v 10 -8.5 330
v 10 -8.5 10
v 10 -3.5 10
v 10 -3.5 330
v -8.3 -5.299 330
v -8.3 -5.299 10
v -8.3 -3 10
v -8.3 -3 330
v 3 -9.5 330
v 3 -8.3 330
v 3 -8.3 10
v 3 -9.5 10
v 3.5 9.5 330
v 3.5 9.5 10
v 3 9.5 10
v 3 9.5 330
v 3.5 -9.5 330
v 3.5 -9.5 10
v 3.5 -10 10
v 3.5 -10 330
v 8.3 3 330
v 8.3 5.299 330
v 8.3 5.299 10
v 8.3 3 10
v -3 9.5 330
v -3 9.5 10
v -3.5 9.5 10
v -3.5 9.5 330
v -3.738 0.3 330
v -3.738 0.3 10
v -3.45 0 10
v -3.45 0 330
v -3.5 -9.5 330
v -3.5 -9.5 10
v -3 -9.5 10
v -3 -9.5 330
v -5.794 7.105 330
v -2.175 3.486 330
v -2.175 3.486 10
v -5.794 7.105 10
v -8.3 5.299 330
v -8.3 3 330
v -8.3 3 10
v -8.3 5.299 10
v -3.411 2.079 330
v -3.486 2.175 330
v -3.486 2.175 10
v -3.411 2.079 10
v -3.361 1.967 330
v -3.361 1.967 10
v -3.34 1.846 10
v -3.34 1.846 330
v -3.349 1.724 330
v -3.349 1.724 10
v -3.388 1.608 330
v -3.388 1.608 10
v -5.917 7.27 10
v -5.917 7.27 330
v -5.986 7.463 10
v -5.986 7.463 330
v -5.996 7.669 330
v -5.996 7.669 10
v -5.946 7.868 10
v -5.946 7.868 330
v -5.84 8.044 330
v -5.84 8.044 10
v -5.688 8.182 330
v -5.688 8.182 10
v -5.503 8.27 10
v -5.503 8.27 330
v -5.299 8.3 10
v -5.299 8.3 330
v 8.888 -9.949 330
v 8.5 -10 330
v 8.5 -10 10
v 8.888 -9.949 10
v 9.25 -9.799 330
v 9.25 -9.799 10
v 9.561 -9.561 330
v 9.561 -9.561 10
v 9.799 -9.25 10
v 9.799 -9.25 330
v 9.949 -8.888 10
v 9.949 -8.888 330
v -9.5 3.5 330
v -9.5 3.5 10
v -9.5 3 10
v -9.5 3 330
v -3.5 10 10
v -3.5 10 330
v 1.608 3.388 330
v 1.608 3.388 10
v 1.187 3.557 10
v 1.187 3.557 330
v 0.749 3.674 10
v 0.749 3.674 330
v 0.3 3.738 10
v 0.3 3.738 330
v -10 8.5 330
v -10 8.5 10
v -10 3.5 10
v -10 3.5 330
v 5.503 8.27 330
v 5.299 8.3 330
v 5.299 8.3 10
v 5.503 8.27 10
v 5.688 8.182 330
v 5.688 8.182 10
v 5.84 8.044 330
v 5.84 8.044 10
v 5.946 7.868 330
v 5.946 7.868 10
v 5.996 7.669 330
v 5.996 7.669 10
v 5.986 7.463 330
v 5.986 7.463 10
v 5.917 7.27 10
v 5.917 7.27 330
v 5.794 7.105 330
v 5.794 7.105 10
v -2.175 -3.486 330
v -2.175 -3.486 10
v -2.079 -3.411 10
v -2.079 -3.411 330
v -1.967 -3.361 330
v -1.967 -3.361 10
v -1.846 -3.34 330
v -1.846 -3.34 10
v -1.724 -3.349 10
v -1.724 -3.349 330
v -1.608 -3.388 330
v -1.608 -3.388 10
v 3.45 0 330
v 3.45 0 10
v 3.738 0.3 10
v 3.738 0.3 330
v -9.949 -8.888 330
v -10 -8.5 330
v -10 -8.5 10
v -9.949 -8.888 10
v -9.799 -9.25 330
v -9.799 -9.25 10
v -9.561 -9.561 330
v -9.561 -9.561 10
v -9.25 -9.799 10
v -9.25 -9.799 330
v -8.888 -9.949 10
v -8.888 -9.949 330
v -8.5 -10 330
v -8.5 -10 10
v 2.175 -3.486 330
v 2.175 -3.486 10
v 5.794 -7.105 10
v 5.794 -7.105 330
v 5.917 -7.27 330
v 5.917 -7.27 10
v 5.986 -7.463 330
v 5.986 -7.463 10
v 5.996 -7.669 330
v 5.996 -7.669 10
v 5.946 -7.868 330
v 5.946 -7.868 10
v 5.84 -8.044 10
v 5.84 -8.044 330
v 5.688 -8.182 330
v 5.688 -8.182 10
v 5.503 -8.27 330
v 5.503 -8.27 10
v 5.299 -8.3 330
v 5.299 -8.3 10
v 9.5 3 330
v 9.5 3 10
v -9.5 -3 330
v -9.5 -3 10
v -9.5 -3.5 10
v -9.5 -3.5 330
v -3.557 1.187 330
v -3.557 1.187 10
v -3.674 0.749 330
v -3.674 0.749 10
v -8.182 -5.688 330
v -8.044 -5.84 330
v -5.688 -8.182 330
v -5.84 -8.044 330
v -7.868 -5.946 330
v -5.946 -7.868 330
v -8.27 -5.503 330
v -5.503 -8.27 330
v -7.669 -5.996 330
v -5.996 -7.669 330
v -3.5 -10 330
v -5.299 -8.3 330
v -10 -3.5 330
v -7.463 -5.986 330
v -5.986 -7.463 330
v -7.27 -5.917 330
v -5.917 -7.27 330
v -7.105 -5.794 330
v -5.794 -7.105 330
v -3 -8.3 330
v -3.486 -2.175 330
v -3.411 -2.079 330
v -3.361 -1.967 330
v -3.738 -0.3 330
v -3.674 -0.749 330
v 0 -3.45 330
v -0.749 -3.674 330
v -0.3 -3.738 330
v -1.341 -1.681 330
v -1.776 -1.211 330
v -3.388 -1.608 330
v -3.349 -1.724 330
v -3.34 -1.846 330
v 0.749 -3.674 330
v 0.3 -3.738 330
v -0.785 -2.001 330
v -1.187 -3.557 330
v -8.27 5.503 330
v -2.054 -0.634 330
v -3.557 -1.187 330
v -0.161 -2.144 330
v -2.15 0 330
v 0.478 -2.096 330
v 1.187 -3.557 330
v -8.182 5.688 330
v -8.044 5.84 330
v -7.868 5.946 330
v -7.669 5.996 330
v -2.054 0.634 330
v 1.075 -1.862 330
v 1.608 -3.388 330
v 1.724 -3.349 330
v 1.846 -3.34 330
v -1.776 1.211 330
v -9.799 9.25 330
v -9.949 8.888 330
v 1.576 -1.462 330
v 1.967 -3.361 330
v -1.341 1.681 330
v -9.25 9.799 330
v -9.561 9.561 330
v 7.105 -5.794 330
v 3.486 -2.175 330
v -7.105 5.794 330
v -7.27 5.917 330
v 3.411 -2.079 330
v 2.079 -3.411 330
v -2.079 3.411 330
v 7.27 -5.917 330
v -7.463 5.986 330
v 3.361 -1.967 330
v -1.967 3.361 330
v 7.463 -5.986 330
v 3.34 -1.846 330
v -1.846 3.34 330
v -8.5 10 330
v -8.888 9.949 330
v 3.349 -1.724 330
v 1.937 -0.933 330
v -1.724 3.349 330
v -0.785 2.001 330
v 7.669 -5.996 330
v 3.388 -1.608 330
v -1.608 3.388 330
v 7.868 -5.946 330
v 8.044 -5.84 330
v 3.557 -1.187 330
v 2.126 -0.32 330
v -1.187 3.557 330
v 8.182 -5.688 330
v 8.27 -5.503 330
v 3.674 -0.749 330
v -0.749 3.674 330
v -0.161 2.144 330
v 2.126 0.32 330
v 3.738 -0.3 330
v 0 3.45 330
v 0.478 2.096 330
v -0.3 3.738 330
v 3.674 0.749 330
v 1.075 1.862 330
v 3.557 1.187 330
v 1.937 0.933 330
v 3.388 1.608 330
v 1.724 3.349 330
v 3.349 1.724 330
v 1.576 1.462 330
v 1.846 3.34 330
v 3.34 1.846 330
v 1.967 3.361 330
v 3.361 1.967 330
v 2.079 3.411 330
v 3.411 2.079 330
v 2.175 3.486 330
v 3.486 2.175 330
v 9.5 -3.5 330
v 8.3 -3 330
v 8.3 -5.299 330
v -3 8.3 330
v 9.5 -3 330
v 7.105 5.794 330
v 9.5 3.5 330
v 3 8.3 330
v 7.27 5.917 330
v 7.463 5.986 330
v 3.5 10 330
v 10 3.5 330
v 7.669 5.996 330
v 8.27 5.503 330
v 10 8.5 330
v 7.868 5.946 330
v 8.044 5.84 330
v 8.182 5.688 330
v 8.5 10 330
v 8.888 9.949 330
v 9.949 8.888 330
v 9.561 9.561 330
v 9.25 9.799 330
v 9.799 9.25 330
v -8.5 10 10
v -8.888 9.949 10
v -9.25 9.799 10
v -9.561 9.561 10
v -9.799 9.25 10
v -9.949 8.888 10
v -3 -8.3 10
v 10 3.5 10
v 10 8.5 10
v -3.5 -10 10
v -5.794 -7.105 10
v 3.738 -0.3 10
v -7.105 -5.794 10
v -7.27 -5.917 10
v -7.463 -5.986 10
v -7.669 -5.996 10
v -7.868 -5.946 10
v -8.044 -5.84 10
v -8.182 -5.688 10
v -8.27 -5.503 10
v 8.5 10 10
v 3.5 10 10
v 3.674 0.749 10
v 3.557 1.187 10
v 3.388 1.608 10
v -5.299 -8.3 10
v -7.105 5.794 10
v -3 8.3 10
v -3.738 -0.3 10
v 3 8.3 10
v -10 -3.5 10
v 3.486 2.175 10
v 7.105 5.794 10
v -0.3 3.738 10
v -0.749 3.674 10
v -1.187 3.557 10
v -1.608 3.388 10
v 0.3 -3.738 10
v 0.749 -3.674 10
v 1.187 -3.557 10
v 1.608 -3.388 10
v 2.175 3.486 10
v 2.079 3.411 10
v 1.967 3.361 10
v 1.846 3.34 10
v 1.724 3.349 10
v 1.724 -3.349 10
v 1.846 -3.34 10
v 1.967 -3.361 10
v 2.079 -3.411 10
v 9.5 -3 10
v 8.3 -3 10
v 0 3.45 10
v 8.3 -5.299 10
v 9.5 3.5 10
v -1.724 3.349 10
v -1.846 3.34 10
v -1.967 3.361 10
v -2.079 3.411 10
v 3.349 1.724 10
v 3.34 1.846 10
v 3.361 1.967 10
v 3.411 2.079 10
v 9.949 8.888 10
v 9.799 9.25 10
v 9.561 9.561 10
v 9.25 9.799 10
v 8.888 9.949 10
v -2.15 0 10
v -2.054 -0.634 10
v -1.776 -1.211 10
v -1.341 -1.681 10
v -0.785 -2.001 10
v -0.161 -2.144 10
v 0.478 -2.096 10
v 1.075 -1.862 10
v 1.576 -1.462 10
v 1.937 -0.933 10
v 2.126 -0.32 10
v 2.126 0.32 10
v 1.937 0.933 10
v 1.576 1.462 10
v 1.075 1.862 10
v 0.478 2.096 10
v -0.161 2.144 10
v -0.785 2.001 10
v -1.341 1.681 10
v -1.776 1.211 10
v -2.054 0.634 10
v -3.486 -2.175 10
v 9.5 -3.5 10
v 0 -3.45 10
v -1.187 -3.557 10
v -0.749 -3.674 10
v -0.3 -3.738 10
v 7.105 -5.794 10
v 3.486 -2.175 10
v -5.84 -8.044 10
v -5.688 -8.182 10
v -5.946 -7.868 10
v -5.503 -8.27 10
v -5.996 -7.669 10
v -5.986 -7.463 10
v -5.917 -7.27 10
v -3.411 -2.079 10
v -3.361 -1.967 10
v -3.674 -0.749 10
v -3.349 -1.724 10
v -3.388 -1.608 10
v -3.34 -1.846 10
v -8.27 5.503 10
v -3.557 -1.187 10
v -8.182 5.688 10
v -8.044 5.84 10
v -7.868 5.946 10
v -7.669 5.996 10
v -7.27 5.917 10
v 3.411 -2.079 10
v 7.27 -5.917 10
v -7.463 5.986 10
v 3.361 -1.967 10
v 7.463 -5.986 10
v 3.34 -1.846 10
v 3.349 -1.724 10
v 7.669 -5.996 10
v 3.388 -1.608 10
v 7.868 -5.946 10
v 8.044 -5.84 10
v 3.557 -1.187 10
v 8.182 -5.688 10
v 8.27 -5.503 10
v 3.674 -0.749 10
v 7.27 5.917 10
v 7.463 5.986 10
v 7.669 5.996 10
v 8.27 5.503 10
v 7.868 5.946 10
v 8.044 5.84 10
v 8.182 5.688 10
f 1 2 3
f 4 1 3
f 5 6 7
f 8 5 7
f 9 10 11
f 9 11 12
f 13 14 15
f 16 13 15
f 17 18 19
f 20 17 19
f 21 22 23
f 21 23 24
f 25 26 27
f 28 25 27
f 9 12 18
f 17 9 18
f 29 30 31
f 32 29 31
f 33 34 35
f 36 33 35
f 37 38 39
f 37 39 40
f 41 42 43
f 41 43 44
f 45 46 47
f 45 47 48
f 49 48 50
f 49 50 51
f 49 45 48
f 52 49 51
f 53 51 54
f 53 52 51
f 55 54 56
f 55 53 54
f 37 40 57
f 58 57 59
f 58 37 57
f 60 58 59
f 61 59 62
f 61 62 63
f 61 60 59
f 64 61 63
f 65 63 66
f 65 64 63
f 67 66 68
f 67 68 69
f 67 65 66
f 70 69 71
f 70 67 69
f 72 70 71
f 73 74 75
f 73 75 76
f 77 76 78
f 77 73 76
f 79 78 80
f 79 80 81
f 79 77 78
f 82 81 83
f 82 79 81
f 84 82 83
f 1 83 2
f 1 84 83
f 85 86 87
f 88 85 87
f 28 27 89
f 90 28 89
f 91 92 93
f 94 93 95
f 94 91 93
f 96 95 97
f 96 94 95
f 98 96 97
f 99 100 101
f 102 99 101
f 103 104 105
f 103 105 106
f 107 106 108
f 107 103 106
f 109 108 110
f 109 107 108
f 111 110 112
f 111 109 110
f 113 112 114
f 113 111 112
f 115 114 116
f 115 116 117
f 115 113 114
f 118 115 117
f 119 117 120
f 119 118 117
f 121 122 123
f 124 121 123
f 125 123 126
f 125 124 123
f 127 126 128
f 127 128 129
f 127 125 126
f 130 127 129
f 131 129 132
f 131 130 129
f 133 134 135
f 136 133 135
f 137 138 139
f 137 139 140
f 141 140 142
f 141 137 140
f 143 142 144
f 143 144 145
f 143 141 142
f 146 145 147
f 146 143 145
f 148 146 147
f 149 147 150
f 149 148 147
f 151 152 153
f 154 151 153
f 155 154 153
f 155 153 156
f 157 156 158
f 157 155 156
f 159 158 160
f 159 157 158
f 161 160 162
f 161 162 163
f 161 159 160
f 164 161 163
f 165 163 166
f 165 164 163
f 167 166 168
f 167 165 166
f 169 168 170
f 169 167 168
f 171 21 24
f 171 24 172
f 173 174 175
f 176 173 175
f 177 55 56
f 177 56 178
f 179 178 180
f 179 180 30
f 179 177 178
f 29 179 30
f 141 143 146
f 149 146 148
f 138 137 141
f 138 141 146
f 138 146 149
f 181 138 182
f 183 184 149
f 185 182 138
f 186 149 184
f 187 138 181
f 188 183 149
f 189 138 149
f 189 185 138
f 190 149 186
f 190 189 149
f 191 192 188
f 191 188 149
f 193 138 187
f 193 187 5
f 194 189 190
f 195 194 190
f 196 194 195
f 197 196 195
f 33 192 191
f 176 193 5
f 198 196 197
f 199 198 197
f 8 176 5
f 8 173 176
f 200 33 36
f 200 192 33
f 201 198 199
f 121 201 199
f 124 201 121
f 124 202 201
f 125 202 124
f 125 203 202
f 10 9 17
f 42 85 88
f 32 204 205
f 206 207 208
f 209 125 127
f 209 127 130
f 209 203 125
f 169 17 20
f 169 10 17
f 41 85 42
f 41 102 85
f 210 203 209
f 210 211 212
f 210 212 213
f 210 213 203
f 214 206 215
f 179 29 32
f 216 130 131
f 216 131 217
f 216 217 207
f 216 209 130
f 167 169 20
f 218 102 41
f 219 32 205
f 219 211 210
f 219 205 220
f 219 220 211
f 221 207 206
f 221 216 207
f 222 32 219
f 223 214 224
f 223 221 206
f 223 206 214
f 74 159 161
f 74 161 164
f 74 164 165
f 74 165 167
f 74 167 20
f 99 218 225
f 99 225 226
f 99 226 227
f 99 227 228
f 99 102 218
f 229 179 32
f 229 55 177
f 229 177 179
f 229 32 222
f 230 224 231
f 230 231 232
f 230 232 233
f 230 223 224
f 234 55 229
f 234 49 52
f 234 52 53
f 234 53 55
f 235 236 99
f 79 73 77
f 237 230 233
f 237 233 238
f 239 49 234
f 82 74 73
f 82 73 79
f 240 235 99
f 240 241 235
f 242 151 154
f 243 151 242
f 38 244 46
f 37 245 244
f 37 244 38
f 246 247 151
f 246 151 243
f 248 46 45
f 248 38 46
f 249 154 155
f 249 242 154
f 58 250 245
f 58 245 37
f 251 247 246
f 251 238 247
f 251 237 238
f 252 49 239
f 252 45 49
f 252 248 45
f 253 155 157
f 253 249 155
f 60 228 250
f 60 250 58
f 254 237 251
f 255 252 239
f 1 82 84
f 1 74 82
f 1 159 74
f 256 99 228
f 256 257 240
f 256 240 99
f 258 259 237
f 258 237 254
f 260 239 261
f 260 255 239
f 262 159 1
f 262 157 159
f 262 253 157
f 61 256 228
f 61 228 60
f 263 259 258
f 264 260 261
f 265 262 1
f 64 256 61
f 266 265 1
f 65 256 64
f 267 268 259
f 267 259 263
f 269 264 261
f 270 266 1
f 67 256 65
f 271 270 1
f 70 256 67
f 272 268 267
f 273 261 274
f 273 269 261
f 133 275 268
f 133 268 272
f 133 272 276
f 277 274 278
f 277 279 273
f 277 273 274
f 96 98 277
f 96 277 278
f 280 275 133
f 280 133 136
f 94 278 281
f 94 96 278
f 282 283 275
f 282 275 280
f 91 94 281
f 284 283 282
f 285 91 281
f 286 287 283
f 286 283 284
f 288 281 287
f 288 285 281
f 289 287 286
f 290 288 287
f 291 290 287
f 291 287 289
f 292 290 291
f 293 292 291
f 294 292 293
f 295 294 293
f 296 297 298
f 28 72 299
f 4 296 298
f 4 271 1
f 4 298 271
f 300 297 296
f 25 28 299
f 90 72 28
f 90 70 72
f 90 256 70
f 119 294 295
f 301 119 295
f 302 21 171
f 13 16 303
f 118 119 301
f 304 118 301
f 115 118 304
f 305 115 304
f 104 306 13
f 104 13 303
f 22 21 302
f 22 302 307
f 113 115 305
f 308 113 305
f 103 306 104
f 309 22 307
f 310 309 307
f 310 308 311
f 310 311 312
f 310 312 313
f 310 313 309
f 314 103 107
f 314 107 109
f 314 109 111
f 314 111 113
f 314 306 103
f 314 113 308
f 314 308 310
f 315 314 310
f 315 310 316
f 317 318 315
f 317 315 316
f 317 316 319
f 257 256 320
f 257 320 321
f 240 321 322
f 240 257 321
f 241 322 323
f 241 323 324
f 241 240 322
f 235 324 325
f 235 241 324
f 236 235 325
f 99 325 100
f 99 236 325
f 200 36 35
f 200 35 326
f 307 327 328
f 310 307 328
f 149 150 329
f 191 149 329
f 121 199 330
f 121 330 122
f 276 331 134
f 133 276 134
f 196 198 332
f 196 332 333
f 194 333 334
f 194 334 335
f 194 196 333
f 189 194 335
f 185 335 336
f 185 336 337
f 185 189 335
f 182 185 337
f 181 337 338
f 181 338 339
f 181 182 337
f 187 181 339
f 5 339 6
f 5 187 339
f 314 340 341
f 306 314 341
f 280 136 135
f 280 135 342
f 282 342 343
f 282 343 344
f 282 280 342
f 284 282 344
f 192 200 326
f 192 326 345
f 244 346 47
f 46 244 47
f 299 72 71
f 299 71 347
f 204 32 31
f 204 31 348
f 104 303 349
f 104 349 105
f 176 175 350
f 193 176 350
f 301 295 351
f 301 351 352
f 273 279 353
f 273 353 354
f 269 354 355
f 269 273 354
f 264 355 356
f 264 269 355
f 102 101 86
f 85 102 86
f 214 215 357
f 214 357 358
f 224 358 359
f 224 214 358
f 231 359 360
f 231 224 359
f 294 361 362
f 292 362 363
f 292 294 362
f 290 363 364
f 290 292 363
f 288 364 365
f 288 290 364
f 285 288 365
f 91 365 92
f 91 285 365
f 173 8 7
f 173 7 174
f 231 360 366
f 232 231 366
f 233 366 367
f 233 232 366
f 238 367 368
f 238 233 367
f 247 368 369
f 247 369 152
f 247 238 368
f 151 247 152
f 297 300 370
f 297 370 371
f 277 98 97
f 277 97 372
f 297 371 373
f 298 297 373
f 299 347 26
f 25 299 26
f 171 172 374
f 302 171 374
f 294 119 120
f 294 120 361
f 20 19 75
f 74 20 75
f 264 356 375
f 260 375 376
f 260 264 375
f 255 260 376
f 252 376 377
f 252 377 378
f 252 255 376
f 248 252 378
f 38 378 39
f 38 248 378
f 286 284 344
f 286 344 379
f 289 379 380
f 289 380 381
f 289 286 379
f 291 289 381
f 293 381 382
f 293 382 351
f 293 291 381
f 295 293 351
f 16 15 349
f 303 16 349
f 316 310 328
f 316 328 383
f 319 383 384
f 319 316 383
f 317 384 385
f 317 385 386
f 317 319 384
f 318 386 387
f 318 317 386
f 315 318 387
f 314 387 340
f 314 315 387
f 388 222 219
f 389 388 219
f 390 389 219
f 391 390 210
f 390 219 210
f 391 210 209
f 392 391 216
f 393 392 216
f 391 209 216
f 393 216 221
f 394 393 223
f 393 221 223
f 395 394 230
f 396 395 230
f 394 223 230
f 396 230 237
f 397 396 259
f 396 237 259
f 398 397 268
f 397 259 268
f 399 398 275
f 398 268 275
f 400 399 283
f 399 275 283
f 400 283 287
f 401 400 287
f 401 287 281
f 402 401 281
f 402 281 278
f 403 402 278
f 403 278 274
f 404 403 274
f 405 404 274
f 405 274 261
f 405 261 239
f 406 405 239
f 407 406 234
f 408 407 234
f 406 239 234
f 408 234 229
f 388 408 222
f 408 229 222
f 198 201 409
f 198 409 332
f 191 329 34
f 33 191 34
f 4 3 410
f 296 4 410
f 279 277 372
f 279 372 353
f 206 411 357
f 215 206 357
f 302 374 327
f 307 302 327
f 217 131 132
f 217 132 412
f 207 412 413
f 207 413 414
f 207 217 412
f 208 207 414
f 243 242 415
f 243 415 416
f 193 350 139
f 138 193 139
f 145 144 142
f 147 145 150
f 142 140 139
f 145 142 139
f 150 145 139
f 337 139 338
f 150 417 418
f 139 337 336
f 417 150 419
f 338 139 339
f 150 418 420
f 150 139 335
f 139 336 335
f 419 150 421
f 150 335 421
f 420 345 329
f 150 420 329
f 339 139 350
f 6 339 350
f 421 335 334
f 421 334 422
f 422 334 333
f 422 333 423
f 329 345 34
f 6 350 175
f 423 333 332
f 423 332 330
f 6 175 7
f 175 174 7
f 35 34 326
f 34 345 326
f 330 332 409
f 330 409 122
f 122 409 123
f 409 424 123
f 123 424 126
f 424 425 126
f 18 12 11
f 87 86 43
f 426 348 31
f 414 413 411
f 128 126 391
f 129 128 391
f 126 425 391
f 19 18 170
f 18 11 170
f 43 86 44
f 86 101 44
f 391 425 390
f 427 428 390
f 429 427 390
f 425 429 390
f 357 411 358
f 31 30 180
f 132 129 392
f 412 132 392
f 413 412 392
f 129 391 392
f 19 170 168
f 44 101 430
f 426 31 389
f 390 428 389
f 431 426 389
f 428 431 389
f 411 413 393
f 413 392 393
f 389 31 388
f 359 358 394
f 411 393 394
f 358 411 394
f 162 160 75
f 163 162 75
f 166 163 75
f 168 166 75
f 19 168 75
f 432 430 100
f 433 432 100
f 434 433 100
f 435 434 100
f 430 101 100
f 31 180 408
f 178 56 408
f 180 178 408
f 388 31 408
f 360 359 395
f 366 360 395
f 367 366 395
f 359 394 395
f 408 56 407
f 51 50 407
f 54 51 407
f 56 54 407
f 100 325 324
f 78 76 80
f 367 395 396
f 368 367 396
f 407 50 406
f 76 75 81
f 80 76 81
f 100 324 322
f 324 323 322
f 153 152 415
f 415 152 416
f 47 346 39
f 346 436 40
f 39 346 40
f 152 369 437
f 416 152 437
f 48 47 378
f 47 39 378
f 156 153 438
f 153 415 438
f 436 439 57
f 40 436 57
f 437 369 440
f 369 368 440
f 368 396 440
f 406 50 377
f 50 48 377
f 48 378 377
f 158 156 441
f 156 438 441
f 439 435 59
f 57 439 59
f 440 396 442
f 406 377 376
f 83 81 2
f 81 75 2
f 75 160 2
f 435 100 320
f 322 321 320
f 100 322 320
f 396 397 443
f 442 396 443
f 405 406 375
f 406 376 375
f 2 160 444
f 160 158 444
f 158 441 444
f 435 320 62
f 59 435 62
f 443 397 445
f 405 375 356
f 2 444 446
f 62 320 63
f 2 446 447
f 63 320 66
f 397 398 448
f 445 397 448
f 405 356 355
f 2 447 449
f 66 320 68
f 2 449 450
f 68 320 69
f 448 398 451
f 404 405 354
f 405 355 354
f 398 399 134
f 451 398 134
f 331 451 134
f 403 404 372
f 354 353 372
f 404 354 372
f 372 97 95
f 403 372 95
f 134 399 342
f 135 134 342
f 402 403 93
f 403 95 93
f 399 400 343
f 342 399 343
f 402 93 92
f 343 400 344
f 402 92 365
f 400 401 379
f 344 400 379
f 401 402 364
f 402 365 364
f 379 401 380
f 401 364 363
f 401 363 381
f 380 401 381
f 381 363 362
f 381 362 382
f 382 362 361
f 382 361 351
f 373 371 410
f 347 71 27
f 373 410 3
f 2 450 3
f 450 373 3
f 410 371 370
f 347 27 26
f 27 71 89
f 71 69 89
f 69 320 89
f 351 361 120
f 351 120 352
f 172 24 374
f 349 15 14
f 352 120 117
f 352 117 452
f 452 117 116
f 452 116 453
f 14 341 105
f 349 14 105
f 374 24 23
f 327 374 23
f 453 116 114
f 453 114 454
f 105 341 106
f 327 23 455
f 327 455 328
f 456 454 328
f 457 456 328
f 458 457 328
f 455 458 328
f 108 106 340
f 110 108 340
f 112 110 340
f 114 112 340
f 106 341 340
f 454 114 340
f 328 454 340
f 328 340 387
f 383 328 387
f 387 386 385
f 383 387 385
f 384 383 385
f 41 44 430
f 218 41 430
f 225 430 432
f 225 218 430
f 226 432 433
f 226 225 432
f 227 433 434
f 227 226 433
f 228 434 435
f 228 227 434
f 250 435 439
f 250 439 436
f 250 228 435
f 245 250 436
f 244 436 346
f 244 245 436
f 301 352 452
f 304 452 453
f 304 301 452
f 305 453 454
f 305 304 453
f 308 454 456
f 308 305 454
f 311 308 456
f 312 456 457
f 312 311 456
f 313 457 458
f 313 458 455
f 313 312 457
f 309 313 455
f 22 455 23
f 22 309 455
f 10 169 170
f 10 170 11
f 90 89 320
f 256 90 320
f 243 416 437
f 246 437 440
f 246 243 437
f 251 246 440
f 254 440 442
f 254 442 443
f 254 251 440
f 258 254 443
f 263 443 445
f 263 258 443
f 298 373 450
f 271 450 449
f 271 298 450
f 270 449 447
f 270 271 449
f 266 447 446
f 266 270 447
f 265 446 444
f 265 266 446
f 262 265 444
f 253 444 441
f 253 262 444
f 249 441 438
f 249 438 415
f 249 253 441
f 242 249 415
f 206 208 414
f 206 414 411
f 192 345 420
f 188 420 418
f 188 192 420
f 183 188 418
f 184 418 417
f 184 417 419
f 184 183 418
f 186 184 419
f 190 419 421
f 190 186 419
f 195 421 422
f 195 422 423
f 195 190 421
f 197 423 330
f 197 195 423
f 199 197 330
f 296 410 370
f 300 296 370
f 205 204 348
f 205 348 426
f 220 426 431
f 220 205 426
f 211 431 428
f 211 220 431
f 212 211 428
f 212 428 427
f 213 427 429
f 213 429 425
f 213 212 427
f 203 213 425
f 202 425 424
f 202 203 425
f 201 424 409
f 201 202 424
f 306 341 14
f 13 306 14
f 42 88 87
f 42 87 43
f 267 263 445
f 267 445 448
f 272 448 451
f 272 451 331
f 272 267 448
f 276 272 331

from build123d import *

# Parameters (mm, degrees)
SKETCH1_R           = 2.15
BOSS_EXTRUDE1_DEPTH = 320


# Read off the part's stored shape, not the designer's step: moBlkMgr[nhom 20x20x300]
with BuildPart() as part:
    # Sketch1 → Boss-Extrude1 (new body)
    with BuildSketch(Plane.XY.offset(330)):
        with BuildLine():
            Line((-3.499999948, -10), (-3.499999948, -9.5))
            Line((-3.499999948, -9.5), (-2.999999948, -9.5))
            Line((-2.999999948, -9.5), (-2.999999948, -8.299999966))
            Line((-2.999999948, -8.299999966), (-5.299390249, -8.299999966))
            ThreePointArc((-5.299390249, -8.299999966), (-5.946105921, -7.86787837), (-5.794364998, -7.105025221))
            Line((-5.794364998, -7.105025221), (-2.175465548, -3.48612574))
            ThreePointArc((-2.175465548, -3.48612574), (-1.907085057, -3.346986956), (-1.607569547, -3.387952169))
            ThreePointArc((-1.607569547, -3.387952169), (-0.96970891, -3.622452814), (-0.299999981, -3.73798071))
            Line((-0.299999981, -3.73798071), (1.9e-08, -3.449999972))
            Line((1.9e-08, -3.449999972), (0.300000019, -3.737980711))
            ThreePointArc((0.300000019, -3.737980711), (0.969708957, -3.622452812), (1.607569601, -3.387952162))
            ThreePointArc((1.607569601, -3.387952162), (1.90708511, -3.346986948), (2.175465602, -3.48612573))
            Line((2.175465602, -3.48612573), (5.794365084, -7.105025212))
            ThreePointArc((5.794365084, -7.105025212), (5.946106011, -7.867878366), (5.299390334, -8.299999966))
            Line((5.299390334, -8.299999966), (2.999999948, -8.299999966))
            Line((2.999999948, -8.299999966), (2.999999948, -9.5))
            Line((2.999999948, -9.5), (3.499999948, -9.5))
            Line((3.499999948, -9.5), (3.499999948, -10))
            Line((3.499999948, -10), (8.499999948, -10))
            ThreePointArc((8.499999948, -10), (9.56066012, -9.560660172), (9.999999948, -8.5))
            Line((9.999999948, -8.5), (9.999999948, -3.5))
            Line((9.999999948, -3.5), (9.499999948, -3.5))
            Line((9.499999948, -3.5), (9.499999948, -3))
            Line((9.499999948, -3), (8.299999978, -3))
            Line((8.299999978, -3), (8.299999978, -5.299390319))
            ThreePointArc((8.299999978, -5.299390319), (7.867878379, -5.946105992), (7.105025229, -5.794365063))
            Line((7.105025229, -5.794365063), (3.486125768, -2.17546557))
            ThreePointArc((3.486125768, -2.17546557), (3.346986986, -1.907085078), (3.387952202, -1.607569568))
            ThreePointArc((3.387952202, -1.607569568), (3.622452857, -0.969708918), (3.737980757, -0.299999973))
            Line((3.737980757, -0.299999973), (3.450000019, 2.8e-08))
            Line((3.450000019, 2.8e-08), (3.737980758, 0.300000028))
            ThreePointArc((3.737980758, 0.300000028), (3.622452857, 0.969708973), (3.387952202, 1.607569624))
            ThreePointArc((3.387952202, 1.607569624), (3.346986986, 1.907085133), (3.486125768, 2.175465626))
            Line((3.486125768, 2.175465626), (7.105025231, 5.794365121))
            ThreePointArc((7.105025231, 5.794365121), (7.86787838, 5.94610605), (8.299999978, 5.299390377))
            Line((8.299999978, 5.299390377), (8.299999978, 3))
            Line((8.299999978, 3), (9.499999948, 3))
            Line((9.499999948, 3), (9.499999948, 3.5))
            Line((9.499999948, 3.5), (9.999999948, 3.5))
            Line((9.999999948, 3.5), (9.999999948, 8.5))
            ThreePointArc((9.999999948, 8.5), (9.56066012, 9.560660172), (8.499999948, 10))
            Line((8.499999948, 10), (3.499999948, 10))
            Line((3.499999948, 10), (3.499999948, 9.5))
            Line((3.499999948, 9.5), (2.999999948, 9.5))
            Line((2.999999948, 9.5), (2.999999948, 8.300000022))
            Line((2.999999948, 8.300000022), (5.299390294, 8.300000022))
            ThreePointArc((5.299390294, 8.300000022), (5.946105963, 7.867878428), (5.794365041, 7.105025282))
            Line((5.794365041, 7.105025282), (2.175465586, 3.486125796))
            ThreePointArc((2.175465586, 3.486125796), (1.907085095, 3.346987012), (1.607569585, 3.387952225))
            ThreePointArc((1.607569585, 3.387952225), (0.969708948, 3.62245287), (0.300000018, 3.737980766))
            Line((0.300000018, 3.737980766), (1.9e-08, 3.450000028))
            Line((1.9e-08, 3.450000028), (-0.299999982, 3.737980766))
            ThreePointArc((-0.299999982, 3.737980766), (-0.969708911, 3.62245287), (-1.607569547, 3.387952225))
            ThreePointArc((-1.607569547, 3.387952225), (-1.907085057, 3.346987012), (-2.175465548, 3.486125796))
            Line((-2.175465548, 3.486125796), (-5.794364998, 7.105025277))
            ThreePointArc((-5.794364998, 7.105025277), (-5.946105921, 7.867878426), (-5.299390249, 8.300000022))
            Line((-5.299390249, 8.300000022), (-2.999999948, 8.300000022))
            Line((-2.999999948, 8.300000022), (-2.999999948, 9.5))
            Line((-2.999999948, 9.5), (-3.499999948, 9.5))
            Line((-3.499999948, 9.5), (-3.499999948, 10))
            Line((-3.499999948, 10), (-8.499999948, 10))
            ThreePointArc((-8.499999948, 10), (-9.56066012, 9.560660172), (-9.999999948, 8.5))
            Line((-9.999999948, 8.5), (-9.999999948, 3.5))
            Line((-9.999999948, 3.5), (-9.499999948, 3.5))
            Line((-9.499999948, 3.5), (-9.499999948, 3))
            Line((-9.499999948, 3), (-8.29999994, 3))
            Line((-8.29999994, 3), (-8.29999994, 5.299390329))
            ThreePointArc((-8.29999994, 5.299390329), (-7.867878345, 5.946105998), (-7.105025201, 5.794365073))
            Line((-7.105025201, 5.794365073), (-3.486125739, 2.175465611))
            ThreePointArc((-3.486125739, 2.175465611), (-3.346986957, 1.907085119), (-3.387952171, 1.607569609))
            ThreePointArc((-3.387952171, 1.607569609), (-3.622452821, 0.969708966), (-3.737980719, 0.300000029))
            Line((-3.737980719, 0.300000029), (-3.449999981, 2.8e-08))
            Line((-3.449999981, 2.8e-08), (-3.737980719, -0.299999971))
            ThreePointArc((-3.737980719, -0.299999971), (-3.622452819, -0.969708917), (-3.387952164, -1.607569568))
            ThreePointArc((-3.387952164, -1.607569568), (-3.346986948, -1.907085078), (-3.486125729, -2.17546557))
            Line((-3.486125729, -2.17546557), (-7.105025191, -5.794365063))
            ThreePointArc((-7.105025191, -5.794365063), (-7.867878341, -5.946105992), (-8.29999994, -5.299390319))
            Line((-8.29999994, -5.299390319), (-8.29999994, -3))
            Line((-8.29999994, -3), (-9.499999948, -3))
            Line((-9.499999948, -3), (-9.499999948, -3.5))
            Line((-9.499999948, -3.5), (-9.999999948, -3.5))
            Line((-9.999999948, -3.5), (-9.999999948, -8.5))
            ThreePointArc((-9.999999948, -8.5), (-9.56066012, -9.560660172), (-8.499999948, -10))
            Line((-8.499999948, -10), (-3.499999948, -10))
        make_face()
        with Locations(Location((1.9e-08, 2.8e-08, 0), (0, 0, 180))):
            Circle(SKETCH1_R, mode=Mode.SUBTRACT)
    extrude(amount=-BOSS_EXTRUDE1_DEPTH)


solid = part.part
